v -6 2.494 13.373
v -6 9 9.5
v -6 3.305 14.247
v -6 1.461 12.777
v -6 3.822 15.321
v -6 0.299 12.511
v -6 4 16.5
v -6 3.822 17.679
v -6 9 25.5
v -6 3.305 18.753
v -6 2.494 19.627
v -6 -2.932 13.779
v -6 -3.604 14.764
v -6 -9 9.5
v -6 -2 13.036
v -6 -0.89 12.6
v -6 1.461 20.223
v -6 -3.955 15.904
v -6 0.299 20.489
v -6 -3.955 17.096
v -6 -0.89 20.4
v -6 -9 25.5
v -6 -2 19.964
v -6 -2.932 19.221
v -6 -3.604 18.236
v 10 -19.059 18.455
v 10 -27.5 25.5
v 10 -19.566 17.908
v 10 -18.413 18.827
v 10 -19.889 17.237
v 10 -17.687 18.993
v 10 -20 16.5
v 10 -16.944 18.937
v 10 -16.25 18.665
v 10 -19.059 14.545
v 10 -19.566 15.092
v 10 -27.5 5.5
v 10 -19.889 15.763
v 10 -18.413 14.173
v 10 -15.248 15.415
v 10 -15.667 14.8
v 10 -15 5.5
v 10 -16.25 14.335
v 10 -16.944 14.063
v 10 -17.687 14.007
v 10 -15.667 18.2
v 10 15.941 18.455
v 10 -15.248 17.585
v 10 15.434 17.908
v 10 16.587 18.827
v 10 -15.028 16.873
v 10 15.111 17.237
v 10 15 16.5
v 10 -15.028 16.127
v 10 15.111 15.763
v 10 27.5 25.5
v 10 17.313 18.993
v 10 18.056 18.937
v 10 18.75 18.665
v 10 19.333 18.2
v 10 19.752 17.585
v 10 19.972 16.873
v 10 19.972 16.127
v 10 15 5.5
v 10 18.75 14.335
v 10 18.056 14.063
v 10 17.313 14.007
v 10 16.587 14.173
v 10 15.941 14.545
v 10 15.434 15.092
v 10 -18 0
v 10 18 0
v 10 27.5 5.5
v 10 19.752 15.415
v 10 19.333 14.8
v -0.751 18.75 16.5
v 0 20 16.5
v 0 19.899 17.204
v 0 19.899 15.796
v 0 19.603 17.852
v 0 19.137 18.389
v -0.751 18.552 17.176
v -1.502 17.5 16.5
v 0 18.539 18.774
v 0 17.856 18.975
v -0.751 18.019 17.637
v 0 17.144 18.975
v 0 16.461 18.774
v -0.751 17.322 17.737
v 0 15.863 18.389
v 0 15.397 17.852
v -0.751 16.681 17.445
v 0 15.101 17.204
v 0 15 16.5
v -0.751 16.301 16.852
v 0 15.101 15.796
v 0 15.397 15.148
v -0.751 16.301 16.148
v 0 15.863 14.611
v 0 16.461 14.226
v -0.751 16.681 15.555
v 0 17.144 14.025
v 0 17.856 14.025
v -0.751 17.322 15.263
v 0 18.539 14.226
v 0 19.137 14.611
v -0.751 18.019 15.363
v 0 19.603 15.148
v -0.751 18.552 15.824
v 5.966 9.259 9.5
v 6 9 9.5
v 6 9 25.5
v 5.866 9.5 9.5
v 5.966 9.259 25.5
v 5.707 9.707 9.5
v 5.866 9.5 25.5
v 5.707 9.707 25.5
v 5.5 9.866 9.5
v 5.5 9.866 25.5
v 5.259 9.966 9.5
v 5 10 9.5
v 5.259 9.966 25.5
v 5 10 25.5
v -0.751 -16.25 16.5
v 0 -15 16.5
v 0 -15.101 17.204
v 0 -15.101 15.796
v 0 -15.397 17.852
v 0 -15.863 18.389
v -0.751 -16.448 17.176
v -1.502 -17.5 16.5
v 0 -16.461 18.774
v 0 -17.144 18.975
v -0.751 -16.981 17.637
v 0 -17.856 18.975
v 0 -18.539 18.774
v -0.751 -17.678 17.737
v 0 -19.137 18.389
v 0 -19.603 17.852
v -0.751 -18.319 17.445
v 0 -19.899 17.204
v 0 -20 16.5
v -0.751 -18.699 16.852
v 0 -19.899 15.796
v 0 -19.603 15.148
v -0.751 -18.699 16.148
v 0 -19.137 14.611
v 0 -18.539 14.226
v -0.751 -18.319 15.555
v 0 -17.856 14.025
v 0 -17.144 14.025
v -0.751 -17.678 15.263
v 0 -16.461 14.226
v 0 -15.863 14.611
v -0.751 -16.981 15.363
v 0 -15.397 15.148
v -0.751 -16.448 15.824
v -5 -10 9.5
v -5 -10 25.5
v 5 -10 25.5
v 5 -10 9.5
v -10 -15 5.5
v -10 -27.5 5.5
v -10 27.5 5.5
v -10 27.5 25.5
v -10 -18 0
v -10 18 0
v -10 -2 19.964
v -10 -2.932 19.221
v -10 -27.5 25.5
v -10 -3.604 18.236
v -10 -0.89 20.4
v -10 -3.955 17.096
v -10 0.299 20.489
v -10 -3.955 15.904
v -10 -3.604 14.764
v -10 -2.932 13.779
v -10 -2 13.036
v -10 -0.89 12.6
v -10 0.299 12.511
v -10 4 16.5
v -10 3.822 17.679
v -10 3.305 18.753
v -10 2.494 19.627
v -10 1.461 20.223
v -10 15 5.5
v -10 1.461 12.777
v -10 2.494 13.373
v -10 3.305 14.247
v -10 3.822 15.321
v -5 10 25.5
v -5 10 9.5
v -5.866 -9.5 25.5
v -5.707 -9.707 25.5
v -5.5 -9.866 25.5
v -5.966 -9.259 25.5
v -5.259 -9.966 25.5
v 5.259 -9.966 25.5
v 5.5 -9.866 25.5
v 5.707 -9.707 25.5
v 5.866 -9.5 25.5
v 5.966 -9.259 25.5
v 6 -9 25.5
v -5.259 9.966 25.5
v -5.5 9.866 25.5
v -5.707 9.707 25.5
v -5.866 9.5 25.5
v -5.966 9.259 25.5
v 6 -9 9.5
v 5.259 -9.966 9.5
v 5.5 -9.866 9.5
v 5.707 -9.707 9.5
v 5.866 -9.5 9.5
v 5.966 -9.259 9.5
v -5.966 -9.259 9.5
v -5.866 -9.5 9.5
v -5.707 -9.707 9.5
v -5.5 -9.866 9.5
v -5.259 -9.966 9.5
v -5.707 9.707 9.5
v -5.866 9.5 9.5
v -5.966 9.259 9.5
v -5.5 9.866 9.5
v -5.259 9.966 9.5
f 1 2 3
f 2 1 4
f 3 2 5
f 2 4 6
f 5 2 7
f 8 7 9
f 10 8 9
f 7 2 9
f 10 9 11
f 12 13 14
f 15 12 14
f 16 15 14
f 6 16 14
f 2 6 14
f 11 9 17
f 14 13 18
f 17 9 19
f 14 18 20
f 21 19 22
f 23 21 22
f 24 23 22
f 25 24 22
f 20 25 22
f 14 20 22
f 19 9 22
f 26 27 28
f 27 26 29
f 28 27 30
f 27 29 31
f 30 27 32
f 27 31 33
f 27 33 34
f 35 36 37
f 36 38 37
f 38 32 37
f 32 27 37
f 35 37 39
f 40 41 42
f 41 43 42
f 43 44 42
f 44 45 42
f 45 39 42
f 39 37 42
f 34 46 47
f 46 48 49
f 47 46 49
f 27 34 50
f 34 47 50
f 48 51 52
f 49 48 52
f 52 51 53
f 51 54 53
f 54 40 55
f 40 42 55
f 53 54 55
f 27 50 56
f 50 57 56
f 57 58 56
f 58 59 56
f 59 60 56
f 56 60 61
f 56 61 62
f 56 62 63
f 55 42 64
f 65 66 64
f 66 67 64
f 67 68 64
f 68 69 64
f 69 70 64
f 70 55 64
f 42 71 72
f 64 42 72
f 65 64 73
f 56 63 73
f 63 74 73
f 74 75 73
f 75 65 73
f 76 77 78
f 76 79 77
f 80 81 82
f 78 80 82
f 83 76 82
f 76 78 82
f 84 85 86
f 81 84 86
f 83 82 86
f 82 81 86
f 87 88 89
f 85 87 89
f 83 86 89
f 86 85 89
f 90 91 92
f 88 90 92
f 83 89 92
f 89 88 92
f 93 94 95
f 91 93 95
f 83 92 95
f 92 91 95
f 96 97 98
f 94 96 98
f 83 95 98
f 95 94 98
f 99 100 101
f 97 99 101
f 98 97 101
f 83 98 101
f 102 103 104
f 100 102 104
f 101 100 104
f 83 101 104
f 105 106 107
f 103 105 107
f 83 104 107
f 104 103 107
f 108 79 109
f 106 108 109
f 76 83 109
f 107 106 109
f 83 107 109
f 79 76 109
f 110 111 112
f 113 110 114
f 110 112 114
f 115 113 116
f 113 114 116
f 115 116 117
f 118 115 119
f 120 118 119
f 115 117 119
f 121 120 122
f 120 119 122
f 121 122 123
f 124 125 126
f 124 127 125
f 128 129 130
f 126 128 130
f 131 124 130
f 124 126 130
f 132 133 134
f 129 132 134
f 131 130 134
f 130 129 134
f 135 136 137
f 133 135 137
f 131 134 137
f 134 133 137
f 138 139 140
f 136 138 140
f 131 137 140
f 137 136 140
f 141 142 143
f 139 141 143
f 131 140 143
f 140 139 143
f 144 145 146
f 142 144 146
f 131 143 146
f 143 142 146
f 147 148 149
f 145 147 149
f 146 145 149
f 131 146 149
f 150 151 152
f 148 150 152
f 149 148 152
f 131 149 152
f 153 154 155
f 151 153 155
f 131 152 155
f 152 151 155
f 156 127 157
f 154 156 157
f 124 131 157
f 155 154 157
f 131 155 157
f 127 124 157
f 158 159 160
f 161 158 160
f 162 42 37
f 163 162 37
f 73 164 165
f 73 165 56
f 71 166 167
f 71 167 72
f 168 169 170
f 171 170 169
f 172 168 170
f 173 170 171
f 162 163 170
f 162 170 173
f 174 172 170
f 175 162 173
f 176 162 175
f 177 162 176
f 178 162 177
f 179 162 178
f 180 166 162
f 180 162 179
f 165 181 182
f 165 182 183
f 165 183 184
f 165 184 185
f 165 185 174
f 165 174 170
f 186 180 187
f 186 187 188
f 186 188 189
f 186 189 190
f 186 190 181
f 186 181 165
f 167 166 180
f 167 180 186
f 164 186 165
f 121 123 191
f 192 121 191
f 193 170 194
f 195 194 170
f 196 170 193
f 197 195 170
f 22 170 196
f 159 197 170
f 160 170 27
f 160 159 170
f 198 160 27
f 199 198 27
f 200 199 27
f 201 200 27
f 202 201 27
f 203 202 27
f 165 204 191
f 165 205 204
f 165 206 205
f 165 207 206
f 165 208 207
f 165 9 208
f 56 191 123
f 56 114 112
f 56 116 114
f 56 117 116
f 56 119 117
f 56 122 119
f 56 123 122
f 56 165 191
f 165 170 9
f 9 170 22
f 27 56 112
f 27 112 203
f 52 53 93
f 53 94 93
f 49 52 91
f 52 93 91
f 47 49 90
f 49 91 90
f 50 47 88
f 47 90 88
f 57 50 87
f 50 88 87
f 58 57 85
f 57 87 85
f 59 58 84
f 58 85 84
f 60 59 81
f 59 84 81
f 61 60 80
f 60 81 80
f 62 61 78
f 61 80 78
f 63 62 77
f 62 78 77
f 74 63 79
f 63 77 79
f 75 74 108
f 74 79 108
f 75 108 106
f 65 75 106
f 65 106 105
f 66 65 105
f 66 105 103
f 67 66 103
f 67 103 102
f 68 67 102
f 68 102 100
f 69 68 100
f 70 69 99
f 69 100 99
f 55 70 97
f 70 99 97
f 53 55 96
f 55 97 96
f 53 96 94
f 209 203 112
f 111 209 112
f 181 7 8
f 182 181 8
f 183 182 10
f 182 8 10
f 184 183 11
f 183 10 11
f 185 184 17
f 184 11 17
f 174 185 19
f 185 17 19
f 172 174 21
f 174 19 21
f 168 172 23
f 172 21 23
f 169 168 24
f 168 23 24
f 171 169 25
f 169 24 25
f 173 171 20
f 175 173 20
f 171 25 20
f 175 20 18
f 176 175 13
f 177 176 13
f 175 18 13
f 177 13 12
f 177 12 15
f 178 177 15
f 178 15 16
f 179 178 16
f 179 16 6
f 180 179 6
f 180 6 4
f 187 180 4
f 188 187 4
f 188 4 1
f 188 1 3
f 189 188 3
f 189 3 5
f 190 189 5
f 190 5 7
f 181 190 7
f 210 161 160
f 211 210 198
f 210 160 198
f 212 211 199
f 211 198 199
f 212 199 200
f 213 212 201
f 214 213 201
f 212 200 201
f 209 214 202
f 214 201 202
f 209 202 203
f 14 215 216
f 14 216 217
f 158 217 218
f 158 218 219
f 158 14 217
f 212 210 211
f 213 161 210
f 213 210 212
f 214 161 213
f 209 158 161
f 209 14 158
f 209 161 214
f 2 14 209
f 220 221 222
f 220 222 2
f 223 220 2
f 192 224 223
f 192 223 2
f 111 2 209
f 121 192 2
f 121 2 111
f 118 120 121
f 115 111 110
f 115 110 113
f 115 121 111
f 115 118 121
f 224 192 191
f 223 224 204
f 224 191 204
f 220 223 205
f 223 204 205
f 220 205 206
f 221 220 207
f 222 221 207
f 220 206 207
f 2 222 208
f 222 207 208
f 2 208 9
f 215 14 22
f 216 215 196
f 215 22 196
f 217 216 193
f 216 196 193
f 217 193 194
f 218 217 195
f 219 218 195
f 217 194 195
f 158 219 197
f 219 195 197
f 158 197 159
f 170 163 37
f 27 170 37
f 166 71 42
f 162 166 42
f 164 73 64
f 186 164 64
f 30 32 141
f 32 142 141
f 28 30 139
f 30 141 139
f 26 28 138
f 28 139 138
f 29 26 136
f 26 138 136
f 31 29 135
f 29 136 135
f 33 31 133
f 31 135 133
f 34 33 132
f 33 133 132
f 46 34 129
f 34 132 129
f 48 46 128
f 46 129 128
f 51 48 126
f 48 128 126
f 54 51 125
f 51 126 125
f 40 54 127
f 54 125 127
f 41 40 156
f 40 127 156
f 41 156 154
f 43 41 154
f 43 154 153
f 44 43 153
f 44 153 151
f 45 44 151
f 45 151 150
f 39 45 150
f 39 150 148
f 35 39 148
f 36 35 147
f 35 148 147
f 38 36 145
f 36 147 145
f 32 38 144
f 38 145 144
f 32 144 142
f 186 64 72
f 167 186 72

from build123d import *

# Parameters (mm, degrees)
F0_W     = 20
F0_H     = 55
F1_DEPTH = 25.5
F3_DEPTH = 16
F5_DEPTH = 25
F7_D     = 5
F7_DEPTH = 10
F7_TIP   = 1.5021515476
F9_D     = 8
F9_DEPTH = 10
F9_TIP   = 2.4034424761


with BuildPart() as f1:
    # F0 (on Top) → F1 (new body)
    with BuildSketch(Plane.XY):
        Rectangle(F0_W, F0_H)
    extrude(amount=F1_DEPTH)

    # F2 (on face) → F3 (cut)
    with BuildSketch(Plane.XY.offset(25.5)):
        with BuildLine():
            Line((5, 10), (-5, 10))
            ThreePointArc((-5, 10), (-5.7071067812, 9.7071067812), (-6, 9))
            Line((-6, 9), (-6, -9))
            ThreePointArc((-6, -9), (-5.7071067812, -9.7071067812), (-5, -10))
            Line((-5, -10), (5, -10))
            ThreePointArc((5, -10), (5.7071067812, -9.7071067812), (6, -9))
            Line((6, -9), (6, 9))
            ThreePointArc((6, 9), (5.7071067812, 9.7071067812), (5, 10))
        make_face()
    extrude(amount=-F3_DEPTH, mode=Mode.SUBTRACT)

    # F4 (on face) → F5 (cut)
    with BuildSketch(Plane.YZ.offset(10)):
        Polygon((-27.5, 0), (-18, 0), (-15, 5.5), (-27.5, 5.5), align=None)
        Polygon((27.5, 5.5), (15, 5.5), (18, 0), (27.5, 0), align=None)
    extrude(amount=-F5_DEPTH, mode=Mode.SUBTRACT)

    # F7
    with Locations(Plane.YZ.offset(10)):
        with Locations((-17.5, 16.5), (17.5, 16.5)):
            Hole(F7_D / 2, depth=F7_DEPTH)
            with Locations((0, 0, -(F7_DEPTH + F7_TIP / 2))):  # 118° drill point
                Cone(0, F7_D / 2, F7_TIP, mode=Mode.SUBTRACT)

    # F9
    with Locations(Plane(origin=(-10, 0, 0), x_dir=(0, -1, 0), z_dir=(-1, 0, 0))):
        with Locations((0, 16.5)):
            Hole(F9_D / 2, depth=F9_DEPTH)
            with Locations((0, 0, -(F9_DEPTH + F9_TIP / 2))):  # 118° drill point
                Cone(0, F9_D / 2, F9_TIP, mode=Mode.SUBTRACT)


solid = f1.part
